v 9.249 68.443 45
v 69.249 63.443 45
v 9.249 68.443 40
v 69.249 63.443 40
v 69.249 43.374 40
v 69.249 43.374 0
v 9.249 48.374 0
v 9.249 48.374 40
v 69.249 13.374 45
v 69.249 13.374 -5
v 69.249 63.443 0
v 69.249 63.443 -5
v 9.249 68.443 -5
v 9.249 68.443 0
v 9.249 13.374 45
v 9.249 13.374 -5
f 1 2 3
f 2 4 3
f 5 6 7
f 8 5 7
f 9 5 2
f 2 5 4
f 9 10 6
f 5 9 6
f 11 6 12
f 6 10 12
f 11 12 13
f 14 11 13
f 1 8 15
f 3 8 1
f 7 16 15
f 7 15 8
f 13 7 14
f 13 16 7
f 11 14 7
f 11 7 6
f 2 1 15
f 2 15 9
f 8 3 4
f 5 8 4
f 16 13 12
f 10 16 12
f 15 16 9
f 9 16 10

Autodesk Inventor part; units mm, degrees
ref_plane "YZ Plane" through (0, 0, 0) normal (1, 0, 0) x (0, 1, 0)
ref_plane "XZ Plane" through (0, 0, 0) normal (0, 1, 0) x (-1, 0, 0)
ref_plane "XY Plane" through (0, 0, 0) normal (0, 0, 1) x (1, 0, 0)
sketch "Sketch1" plane through (0, 0, 0) normal (0, 0, 1) x (1, 0, 0)
  line L0 (9.2486, 13.3739) -> (9.2486, 48.3739)
  line L1 (9.2486, 13.3739) -> (69.2486, 13.3739)
  line L2 (69.2486, 13.3739) -> (69.2486, 43.3739)
  line L3 (69.2486, 43.3739) -> (9.2486, 48.3739)
  line L4 (69.2486, 63.4432) -> (9.2486, 68.4432)
  line L5 (9.2486, 48.3739) -> (9.2486, 68.4432)
  line L6 (69.2486, 43.3739) -> (69.2486, 63.4432)
  point P0 (0, 0)
  dimension "d0" = 35
  dimension "d1" = 60
  dimension "d2" = 30
  dimension "d3" = 20
extrude "Extrusion1" add sketch "Sketch1" along normal blind 45 and the other way blind 5 contours L0 L3 L2 L1
extrude "Extrusion2" add sketch "Sketch1" against normal blind 5 contours L5 L4 L6 L3
extrude "Extrusion3" add sketch "Sketch1" along normal blind 45 contours L5 L4 L6 L3
extrude "Extrusion4" cut sketch "Sketch1" along normal blind 40 contours L5 L4 L6 L3
properties part number "collectionslideintoscrew"
